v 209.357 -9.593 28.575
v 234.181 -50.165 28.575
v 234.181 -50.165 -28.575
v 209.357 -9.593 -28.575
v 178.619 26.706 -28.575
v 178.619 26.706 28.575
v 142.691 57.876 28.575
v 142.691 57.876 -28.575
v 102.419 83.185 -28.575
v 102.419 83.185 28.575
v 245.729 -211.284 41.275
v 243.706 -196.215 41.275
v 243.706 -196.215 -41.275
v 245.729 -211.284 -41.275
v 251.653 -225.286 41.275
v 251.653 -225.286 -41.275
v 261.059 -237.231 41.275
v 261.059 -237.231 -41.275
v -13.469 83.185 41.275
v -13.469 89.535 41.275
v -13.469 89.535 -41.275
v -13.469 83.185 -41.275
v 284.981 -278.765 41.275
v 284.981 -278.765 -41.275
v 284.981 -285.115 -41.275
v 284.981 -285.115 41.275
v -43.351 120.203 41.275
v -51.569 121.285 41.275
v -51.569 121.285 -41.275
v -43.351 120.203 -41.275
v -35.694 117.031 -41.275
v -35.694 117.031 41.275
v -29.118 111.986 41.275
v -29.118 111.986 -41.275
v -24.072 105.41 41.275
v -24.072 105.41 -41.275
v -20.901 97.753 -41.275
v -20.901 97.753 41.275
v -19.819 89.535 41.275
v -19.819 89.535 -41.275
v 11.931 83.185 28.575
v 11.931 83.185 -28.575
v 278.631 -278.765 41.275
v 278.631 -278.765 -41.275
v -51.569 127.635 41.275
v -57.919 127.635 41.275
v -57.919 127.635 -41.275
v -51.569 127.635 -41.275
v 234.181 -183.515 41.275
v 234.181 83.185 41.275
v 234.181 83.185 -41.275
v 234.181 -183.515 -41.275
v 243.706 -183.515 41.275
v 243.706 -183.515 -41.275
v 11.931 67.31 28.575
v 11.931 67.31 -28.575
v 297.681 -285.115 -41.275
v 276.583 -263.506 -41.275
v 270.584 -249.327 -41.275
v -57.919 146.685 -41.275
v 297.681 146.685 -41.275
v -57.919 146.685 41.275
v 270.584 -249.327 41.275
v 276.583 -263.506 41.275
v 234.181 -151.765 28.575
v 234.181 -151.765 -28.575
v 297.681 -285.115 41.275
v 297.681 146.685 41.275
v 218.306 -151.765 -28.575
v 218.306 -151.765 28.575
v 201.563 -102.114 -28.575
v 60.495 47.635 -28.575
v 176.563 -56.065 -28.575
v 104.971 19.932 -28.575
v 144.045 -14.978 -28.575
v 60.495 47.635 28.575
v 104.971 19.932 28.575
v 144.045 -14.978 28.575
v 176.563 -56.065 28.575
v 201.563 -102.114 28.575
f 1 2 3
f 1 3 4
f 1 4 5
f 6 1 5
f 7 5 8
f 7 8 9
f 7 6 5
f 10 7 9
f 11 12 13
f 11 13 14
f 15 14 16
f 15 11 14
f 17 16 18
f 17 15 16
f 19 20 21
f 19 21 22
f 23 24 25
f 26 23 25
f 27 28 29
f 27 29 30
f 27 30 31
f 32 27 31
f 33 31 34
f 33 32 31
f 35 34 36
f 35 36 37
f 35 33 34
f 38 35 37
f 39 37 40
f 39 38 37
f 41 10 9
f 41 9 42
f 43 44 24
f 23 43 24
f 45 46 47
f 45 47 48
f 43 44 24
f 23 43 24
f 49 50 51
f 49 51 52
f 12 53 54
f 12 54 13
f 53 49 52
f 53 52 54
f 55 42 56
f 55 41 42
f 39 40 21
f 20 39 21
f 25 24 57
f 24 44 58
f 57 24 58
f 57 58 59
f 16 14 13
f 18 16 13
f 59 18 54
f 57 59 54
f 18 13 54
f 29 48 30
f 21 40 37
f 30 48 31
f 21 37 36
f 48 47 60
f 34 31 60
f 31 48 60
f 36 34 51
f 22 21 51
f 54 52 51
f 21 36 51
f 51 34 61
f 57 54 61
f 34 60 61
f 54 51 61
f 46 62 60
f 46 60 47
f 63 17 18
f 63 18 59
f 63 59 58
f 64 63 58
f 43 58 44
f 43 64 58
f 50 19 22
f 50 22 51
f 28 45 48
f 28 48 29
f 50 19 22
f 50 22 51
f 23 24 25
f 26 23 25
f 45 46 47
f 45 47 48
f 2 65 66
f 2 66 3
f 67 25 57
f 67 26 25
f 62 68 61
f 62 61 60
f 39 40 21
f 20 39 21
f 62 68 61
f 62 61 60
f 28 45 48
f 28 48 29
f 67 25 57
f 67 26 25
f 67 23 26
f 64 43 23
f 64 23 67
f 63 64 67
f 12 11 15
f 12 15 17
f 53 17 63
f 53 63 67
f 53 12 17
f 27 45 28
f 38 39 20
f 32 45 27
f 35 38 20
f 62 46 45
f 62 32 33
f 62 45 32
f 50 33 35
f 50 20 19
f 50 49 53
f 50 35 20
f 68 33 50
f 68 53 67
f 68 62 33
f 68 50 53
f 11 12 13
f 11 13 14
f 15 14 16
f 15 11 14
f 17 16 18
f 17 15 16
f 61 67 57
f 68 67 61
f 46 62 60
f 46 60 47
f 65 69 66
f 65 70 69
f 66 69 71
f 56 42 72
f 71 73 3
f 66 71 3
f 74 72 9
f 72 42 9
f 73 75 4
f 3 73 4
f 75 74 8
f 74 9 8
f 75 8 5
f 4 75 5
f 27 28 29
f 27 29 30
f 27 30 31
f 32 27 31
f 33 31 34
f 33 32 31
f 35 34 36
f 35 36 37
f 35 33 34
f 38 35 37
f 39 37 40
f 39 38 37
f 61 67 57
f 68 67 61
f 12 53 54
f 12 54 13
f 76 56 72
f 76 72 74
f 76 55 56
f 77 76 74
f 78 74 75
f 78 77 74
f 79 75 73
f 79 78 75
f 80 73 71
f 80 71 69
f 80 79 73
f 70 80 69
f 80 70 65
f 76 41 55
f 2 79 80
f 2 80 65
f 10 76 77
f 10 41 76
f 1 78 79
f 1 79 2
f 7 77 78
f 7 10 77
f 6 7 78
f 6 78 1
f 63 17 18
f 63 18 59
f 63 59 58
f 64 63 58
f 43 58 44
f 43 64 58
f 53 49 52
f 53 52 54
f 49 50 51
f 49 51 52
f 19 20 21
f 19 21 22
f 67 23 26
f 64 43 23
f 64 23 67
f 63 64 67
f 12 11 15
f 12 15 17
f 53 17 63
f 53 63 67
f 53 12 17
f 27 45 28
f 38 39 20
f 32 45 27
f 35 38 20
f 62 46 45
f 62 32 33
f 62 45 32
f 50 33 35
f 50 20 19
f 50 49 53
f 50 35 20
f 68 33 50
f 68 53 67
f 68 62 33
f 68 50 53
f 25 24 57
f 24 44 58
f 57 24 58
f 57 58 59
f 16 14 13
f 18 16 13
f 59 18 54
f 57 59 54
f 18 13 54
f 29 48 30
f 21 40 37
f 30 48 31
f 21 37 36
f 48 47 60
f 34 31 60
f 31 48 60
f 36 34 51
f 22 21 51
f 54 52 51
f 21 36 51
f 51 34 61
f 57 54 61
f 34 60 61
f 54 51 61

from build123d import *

# Parameters (mm, degrees)
BOSS_EXTRUDE1_DEPTH = 41.275
BOSS_EXTRUDE2_DEPTH = 28.575
BOSS_EXTRUDE3_DEPTH = 41.275


with BuildPart() as part:
    # Sketch1 → Boss-Extrude1 (new body, symmetric)
    with BuildSketch(Plane.XY):
        with BuildLine():
            Line((297.681223016, -285.115), (297.681223016, 146.685))
            Line((297.681223016, 146.685), (-57.918776984, 146.685))
            Line((-57.918776984, 146.685), (-57.918776984, 127.635))
            Line((-57.918776984, 127.635), (-51.568776984, 127.635))
            Line((-51.568776984, 127.635), (-51.568776984, 121.285))
            ThreePointArc((-51.568776984, 121.285), (-29.118136682, 111.985640303), (-19.818776984, 89.535))
            Line((-19.818776984, 89.535), (-13.468776984, 89.535))
            Line((-13.468776984, 89.535), (-13.468776984, 83.185))
            Line((-13.468776984, 83.185), (234.181223016, 83.185))
            Line((234.181223016, 83.185), (234.181223016, -183.515))
            Line((234.181223016, -183.515), (243.706223016, -183.515))
            Line((243.706223016, -183.515), (243.706223016, -196.215))
            ThreePointArc((243.706223016, -196.215), (248.222944617, -218.482925476), (261.059171573, -237.231060226))
            ThreePointArc((261.059171573, -237.231060226), (274.057472101, -256.215913848), (278.631223016, -278.765))
            Line((278.631223016, -278.765), (284.981223016, -278.765))
            Line((284.981223016, -278.765), (284.981223016, -285.115))
            Line((284.981223016, -285.115), (297.681223016, -285.115))
        make_face()
    extrude(amount=BOSS_EXTRUDE1_DEPTH, both=True)


with BuildPart() as body_2:
    # Sketch1_3 → Boss-Extrude2 (new body, symmetric)
    with BuildSketch(Plane.XY):
        with BuildLine():
            Line((218.306223016, -151.765), (234.181223016, -151.765))
            Line((234.181223016, -151.765), (234.181223016, -50.165))
            ThreePointArc((234.181223016, -50.165), (178.618723016, 26.705907738), (102.418723016, 83.185))
            Line((102.418723016, 83.185), (11.931223016, 83.185))
            Line((11.931223016, 83.185), (11.931223016, 67.31))
            ThreePointArc((11.931223016, 67.31), (144.044926072, -14.97817828), (218.306223016, -151.765))
        make_face()
    extrude(amount=BOSS_EXTRUDE2_DEPTH, both=True)


with BuildPart() as body_3:
    # Sketch1_4 → Boss-Extrude3 (new body, symmetric)
    with BuildSketch(Plane.XY):
        with BuildLine():
            Line((297.681223016, -285.115), (297.681223016, 146.685))
            Line((297.681223016, 146.685), (-57.918776984, 146.685))
            Line((-57.918776984, 146.685), (-57.918776984, 127.635))
            Line((-57.918776984, 127.635), (-51.568776984, 127.635))
            Line((-51.568776984, 127.635), (-51.568776984, 121.285))
            ThreePointArc((-51.568776984, 121.285), (-29.118136682, 111.985640303), (-19.818776984, 89.535))
            Line((-19.818776984, 89.535), (-13.468776984, 89.535))
            Line((-13.468776984, 89.535), (-13.468776984, 83.185))
            Line((-13.468776984, 83.185), (234.181223016, 83.185))
            Line((234.181223016, 83.185), (234.181223016, -183.515))
            Line((234.181223016, -183.515), (243.706223016, -183.515))
            Line((243.706223016, -183.515), (243.706223016, -196.215))
            ThreePointArc((243.706223016, -196.215), (248.222944617, -218.482925476), (261.059171573, -237.231060226))
            ThreePointArc((261.059171573, -237.231060226), (274.057472101, -256.215913848), (278.631223016, -278.765))
            Line((278.631223016, -278.765), (284.981223016, -278.765))
            Line((284.981223016, -278.765), (284.981223016, -285.115))
            Line((284.981223016, -285.115), (297.681223016, -285.115))
        make_face()
    extrude(amount=BOSS_EXTRUDE3_DEPTH, both=True)


solid = Compound([part.part, body_2.part, body_3.part])
